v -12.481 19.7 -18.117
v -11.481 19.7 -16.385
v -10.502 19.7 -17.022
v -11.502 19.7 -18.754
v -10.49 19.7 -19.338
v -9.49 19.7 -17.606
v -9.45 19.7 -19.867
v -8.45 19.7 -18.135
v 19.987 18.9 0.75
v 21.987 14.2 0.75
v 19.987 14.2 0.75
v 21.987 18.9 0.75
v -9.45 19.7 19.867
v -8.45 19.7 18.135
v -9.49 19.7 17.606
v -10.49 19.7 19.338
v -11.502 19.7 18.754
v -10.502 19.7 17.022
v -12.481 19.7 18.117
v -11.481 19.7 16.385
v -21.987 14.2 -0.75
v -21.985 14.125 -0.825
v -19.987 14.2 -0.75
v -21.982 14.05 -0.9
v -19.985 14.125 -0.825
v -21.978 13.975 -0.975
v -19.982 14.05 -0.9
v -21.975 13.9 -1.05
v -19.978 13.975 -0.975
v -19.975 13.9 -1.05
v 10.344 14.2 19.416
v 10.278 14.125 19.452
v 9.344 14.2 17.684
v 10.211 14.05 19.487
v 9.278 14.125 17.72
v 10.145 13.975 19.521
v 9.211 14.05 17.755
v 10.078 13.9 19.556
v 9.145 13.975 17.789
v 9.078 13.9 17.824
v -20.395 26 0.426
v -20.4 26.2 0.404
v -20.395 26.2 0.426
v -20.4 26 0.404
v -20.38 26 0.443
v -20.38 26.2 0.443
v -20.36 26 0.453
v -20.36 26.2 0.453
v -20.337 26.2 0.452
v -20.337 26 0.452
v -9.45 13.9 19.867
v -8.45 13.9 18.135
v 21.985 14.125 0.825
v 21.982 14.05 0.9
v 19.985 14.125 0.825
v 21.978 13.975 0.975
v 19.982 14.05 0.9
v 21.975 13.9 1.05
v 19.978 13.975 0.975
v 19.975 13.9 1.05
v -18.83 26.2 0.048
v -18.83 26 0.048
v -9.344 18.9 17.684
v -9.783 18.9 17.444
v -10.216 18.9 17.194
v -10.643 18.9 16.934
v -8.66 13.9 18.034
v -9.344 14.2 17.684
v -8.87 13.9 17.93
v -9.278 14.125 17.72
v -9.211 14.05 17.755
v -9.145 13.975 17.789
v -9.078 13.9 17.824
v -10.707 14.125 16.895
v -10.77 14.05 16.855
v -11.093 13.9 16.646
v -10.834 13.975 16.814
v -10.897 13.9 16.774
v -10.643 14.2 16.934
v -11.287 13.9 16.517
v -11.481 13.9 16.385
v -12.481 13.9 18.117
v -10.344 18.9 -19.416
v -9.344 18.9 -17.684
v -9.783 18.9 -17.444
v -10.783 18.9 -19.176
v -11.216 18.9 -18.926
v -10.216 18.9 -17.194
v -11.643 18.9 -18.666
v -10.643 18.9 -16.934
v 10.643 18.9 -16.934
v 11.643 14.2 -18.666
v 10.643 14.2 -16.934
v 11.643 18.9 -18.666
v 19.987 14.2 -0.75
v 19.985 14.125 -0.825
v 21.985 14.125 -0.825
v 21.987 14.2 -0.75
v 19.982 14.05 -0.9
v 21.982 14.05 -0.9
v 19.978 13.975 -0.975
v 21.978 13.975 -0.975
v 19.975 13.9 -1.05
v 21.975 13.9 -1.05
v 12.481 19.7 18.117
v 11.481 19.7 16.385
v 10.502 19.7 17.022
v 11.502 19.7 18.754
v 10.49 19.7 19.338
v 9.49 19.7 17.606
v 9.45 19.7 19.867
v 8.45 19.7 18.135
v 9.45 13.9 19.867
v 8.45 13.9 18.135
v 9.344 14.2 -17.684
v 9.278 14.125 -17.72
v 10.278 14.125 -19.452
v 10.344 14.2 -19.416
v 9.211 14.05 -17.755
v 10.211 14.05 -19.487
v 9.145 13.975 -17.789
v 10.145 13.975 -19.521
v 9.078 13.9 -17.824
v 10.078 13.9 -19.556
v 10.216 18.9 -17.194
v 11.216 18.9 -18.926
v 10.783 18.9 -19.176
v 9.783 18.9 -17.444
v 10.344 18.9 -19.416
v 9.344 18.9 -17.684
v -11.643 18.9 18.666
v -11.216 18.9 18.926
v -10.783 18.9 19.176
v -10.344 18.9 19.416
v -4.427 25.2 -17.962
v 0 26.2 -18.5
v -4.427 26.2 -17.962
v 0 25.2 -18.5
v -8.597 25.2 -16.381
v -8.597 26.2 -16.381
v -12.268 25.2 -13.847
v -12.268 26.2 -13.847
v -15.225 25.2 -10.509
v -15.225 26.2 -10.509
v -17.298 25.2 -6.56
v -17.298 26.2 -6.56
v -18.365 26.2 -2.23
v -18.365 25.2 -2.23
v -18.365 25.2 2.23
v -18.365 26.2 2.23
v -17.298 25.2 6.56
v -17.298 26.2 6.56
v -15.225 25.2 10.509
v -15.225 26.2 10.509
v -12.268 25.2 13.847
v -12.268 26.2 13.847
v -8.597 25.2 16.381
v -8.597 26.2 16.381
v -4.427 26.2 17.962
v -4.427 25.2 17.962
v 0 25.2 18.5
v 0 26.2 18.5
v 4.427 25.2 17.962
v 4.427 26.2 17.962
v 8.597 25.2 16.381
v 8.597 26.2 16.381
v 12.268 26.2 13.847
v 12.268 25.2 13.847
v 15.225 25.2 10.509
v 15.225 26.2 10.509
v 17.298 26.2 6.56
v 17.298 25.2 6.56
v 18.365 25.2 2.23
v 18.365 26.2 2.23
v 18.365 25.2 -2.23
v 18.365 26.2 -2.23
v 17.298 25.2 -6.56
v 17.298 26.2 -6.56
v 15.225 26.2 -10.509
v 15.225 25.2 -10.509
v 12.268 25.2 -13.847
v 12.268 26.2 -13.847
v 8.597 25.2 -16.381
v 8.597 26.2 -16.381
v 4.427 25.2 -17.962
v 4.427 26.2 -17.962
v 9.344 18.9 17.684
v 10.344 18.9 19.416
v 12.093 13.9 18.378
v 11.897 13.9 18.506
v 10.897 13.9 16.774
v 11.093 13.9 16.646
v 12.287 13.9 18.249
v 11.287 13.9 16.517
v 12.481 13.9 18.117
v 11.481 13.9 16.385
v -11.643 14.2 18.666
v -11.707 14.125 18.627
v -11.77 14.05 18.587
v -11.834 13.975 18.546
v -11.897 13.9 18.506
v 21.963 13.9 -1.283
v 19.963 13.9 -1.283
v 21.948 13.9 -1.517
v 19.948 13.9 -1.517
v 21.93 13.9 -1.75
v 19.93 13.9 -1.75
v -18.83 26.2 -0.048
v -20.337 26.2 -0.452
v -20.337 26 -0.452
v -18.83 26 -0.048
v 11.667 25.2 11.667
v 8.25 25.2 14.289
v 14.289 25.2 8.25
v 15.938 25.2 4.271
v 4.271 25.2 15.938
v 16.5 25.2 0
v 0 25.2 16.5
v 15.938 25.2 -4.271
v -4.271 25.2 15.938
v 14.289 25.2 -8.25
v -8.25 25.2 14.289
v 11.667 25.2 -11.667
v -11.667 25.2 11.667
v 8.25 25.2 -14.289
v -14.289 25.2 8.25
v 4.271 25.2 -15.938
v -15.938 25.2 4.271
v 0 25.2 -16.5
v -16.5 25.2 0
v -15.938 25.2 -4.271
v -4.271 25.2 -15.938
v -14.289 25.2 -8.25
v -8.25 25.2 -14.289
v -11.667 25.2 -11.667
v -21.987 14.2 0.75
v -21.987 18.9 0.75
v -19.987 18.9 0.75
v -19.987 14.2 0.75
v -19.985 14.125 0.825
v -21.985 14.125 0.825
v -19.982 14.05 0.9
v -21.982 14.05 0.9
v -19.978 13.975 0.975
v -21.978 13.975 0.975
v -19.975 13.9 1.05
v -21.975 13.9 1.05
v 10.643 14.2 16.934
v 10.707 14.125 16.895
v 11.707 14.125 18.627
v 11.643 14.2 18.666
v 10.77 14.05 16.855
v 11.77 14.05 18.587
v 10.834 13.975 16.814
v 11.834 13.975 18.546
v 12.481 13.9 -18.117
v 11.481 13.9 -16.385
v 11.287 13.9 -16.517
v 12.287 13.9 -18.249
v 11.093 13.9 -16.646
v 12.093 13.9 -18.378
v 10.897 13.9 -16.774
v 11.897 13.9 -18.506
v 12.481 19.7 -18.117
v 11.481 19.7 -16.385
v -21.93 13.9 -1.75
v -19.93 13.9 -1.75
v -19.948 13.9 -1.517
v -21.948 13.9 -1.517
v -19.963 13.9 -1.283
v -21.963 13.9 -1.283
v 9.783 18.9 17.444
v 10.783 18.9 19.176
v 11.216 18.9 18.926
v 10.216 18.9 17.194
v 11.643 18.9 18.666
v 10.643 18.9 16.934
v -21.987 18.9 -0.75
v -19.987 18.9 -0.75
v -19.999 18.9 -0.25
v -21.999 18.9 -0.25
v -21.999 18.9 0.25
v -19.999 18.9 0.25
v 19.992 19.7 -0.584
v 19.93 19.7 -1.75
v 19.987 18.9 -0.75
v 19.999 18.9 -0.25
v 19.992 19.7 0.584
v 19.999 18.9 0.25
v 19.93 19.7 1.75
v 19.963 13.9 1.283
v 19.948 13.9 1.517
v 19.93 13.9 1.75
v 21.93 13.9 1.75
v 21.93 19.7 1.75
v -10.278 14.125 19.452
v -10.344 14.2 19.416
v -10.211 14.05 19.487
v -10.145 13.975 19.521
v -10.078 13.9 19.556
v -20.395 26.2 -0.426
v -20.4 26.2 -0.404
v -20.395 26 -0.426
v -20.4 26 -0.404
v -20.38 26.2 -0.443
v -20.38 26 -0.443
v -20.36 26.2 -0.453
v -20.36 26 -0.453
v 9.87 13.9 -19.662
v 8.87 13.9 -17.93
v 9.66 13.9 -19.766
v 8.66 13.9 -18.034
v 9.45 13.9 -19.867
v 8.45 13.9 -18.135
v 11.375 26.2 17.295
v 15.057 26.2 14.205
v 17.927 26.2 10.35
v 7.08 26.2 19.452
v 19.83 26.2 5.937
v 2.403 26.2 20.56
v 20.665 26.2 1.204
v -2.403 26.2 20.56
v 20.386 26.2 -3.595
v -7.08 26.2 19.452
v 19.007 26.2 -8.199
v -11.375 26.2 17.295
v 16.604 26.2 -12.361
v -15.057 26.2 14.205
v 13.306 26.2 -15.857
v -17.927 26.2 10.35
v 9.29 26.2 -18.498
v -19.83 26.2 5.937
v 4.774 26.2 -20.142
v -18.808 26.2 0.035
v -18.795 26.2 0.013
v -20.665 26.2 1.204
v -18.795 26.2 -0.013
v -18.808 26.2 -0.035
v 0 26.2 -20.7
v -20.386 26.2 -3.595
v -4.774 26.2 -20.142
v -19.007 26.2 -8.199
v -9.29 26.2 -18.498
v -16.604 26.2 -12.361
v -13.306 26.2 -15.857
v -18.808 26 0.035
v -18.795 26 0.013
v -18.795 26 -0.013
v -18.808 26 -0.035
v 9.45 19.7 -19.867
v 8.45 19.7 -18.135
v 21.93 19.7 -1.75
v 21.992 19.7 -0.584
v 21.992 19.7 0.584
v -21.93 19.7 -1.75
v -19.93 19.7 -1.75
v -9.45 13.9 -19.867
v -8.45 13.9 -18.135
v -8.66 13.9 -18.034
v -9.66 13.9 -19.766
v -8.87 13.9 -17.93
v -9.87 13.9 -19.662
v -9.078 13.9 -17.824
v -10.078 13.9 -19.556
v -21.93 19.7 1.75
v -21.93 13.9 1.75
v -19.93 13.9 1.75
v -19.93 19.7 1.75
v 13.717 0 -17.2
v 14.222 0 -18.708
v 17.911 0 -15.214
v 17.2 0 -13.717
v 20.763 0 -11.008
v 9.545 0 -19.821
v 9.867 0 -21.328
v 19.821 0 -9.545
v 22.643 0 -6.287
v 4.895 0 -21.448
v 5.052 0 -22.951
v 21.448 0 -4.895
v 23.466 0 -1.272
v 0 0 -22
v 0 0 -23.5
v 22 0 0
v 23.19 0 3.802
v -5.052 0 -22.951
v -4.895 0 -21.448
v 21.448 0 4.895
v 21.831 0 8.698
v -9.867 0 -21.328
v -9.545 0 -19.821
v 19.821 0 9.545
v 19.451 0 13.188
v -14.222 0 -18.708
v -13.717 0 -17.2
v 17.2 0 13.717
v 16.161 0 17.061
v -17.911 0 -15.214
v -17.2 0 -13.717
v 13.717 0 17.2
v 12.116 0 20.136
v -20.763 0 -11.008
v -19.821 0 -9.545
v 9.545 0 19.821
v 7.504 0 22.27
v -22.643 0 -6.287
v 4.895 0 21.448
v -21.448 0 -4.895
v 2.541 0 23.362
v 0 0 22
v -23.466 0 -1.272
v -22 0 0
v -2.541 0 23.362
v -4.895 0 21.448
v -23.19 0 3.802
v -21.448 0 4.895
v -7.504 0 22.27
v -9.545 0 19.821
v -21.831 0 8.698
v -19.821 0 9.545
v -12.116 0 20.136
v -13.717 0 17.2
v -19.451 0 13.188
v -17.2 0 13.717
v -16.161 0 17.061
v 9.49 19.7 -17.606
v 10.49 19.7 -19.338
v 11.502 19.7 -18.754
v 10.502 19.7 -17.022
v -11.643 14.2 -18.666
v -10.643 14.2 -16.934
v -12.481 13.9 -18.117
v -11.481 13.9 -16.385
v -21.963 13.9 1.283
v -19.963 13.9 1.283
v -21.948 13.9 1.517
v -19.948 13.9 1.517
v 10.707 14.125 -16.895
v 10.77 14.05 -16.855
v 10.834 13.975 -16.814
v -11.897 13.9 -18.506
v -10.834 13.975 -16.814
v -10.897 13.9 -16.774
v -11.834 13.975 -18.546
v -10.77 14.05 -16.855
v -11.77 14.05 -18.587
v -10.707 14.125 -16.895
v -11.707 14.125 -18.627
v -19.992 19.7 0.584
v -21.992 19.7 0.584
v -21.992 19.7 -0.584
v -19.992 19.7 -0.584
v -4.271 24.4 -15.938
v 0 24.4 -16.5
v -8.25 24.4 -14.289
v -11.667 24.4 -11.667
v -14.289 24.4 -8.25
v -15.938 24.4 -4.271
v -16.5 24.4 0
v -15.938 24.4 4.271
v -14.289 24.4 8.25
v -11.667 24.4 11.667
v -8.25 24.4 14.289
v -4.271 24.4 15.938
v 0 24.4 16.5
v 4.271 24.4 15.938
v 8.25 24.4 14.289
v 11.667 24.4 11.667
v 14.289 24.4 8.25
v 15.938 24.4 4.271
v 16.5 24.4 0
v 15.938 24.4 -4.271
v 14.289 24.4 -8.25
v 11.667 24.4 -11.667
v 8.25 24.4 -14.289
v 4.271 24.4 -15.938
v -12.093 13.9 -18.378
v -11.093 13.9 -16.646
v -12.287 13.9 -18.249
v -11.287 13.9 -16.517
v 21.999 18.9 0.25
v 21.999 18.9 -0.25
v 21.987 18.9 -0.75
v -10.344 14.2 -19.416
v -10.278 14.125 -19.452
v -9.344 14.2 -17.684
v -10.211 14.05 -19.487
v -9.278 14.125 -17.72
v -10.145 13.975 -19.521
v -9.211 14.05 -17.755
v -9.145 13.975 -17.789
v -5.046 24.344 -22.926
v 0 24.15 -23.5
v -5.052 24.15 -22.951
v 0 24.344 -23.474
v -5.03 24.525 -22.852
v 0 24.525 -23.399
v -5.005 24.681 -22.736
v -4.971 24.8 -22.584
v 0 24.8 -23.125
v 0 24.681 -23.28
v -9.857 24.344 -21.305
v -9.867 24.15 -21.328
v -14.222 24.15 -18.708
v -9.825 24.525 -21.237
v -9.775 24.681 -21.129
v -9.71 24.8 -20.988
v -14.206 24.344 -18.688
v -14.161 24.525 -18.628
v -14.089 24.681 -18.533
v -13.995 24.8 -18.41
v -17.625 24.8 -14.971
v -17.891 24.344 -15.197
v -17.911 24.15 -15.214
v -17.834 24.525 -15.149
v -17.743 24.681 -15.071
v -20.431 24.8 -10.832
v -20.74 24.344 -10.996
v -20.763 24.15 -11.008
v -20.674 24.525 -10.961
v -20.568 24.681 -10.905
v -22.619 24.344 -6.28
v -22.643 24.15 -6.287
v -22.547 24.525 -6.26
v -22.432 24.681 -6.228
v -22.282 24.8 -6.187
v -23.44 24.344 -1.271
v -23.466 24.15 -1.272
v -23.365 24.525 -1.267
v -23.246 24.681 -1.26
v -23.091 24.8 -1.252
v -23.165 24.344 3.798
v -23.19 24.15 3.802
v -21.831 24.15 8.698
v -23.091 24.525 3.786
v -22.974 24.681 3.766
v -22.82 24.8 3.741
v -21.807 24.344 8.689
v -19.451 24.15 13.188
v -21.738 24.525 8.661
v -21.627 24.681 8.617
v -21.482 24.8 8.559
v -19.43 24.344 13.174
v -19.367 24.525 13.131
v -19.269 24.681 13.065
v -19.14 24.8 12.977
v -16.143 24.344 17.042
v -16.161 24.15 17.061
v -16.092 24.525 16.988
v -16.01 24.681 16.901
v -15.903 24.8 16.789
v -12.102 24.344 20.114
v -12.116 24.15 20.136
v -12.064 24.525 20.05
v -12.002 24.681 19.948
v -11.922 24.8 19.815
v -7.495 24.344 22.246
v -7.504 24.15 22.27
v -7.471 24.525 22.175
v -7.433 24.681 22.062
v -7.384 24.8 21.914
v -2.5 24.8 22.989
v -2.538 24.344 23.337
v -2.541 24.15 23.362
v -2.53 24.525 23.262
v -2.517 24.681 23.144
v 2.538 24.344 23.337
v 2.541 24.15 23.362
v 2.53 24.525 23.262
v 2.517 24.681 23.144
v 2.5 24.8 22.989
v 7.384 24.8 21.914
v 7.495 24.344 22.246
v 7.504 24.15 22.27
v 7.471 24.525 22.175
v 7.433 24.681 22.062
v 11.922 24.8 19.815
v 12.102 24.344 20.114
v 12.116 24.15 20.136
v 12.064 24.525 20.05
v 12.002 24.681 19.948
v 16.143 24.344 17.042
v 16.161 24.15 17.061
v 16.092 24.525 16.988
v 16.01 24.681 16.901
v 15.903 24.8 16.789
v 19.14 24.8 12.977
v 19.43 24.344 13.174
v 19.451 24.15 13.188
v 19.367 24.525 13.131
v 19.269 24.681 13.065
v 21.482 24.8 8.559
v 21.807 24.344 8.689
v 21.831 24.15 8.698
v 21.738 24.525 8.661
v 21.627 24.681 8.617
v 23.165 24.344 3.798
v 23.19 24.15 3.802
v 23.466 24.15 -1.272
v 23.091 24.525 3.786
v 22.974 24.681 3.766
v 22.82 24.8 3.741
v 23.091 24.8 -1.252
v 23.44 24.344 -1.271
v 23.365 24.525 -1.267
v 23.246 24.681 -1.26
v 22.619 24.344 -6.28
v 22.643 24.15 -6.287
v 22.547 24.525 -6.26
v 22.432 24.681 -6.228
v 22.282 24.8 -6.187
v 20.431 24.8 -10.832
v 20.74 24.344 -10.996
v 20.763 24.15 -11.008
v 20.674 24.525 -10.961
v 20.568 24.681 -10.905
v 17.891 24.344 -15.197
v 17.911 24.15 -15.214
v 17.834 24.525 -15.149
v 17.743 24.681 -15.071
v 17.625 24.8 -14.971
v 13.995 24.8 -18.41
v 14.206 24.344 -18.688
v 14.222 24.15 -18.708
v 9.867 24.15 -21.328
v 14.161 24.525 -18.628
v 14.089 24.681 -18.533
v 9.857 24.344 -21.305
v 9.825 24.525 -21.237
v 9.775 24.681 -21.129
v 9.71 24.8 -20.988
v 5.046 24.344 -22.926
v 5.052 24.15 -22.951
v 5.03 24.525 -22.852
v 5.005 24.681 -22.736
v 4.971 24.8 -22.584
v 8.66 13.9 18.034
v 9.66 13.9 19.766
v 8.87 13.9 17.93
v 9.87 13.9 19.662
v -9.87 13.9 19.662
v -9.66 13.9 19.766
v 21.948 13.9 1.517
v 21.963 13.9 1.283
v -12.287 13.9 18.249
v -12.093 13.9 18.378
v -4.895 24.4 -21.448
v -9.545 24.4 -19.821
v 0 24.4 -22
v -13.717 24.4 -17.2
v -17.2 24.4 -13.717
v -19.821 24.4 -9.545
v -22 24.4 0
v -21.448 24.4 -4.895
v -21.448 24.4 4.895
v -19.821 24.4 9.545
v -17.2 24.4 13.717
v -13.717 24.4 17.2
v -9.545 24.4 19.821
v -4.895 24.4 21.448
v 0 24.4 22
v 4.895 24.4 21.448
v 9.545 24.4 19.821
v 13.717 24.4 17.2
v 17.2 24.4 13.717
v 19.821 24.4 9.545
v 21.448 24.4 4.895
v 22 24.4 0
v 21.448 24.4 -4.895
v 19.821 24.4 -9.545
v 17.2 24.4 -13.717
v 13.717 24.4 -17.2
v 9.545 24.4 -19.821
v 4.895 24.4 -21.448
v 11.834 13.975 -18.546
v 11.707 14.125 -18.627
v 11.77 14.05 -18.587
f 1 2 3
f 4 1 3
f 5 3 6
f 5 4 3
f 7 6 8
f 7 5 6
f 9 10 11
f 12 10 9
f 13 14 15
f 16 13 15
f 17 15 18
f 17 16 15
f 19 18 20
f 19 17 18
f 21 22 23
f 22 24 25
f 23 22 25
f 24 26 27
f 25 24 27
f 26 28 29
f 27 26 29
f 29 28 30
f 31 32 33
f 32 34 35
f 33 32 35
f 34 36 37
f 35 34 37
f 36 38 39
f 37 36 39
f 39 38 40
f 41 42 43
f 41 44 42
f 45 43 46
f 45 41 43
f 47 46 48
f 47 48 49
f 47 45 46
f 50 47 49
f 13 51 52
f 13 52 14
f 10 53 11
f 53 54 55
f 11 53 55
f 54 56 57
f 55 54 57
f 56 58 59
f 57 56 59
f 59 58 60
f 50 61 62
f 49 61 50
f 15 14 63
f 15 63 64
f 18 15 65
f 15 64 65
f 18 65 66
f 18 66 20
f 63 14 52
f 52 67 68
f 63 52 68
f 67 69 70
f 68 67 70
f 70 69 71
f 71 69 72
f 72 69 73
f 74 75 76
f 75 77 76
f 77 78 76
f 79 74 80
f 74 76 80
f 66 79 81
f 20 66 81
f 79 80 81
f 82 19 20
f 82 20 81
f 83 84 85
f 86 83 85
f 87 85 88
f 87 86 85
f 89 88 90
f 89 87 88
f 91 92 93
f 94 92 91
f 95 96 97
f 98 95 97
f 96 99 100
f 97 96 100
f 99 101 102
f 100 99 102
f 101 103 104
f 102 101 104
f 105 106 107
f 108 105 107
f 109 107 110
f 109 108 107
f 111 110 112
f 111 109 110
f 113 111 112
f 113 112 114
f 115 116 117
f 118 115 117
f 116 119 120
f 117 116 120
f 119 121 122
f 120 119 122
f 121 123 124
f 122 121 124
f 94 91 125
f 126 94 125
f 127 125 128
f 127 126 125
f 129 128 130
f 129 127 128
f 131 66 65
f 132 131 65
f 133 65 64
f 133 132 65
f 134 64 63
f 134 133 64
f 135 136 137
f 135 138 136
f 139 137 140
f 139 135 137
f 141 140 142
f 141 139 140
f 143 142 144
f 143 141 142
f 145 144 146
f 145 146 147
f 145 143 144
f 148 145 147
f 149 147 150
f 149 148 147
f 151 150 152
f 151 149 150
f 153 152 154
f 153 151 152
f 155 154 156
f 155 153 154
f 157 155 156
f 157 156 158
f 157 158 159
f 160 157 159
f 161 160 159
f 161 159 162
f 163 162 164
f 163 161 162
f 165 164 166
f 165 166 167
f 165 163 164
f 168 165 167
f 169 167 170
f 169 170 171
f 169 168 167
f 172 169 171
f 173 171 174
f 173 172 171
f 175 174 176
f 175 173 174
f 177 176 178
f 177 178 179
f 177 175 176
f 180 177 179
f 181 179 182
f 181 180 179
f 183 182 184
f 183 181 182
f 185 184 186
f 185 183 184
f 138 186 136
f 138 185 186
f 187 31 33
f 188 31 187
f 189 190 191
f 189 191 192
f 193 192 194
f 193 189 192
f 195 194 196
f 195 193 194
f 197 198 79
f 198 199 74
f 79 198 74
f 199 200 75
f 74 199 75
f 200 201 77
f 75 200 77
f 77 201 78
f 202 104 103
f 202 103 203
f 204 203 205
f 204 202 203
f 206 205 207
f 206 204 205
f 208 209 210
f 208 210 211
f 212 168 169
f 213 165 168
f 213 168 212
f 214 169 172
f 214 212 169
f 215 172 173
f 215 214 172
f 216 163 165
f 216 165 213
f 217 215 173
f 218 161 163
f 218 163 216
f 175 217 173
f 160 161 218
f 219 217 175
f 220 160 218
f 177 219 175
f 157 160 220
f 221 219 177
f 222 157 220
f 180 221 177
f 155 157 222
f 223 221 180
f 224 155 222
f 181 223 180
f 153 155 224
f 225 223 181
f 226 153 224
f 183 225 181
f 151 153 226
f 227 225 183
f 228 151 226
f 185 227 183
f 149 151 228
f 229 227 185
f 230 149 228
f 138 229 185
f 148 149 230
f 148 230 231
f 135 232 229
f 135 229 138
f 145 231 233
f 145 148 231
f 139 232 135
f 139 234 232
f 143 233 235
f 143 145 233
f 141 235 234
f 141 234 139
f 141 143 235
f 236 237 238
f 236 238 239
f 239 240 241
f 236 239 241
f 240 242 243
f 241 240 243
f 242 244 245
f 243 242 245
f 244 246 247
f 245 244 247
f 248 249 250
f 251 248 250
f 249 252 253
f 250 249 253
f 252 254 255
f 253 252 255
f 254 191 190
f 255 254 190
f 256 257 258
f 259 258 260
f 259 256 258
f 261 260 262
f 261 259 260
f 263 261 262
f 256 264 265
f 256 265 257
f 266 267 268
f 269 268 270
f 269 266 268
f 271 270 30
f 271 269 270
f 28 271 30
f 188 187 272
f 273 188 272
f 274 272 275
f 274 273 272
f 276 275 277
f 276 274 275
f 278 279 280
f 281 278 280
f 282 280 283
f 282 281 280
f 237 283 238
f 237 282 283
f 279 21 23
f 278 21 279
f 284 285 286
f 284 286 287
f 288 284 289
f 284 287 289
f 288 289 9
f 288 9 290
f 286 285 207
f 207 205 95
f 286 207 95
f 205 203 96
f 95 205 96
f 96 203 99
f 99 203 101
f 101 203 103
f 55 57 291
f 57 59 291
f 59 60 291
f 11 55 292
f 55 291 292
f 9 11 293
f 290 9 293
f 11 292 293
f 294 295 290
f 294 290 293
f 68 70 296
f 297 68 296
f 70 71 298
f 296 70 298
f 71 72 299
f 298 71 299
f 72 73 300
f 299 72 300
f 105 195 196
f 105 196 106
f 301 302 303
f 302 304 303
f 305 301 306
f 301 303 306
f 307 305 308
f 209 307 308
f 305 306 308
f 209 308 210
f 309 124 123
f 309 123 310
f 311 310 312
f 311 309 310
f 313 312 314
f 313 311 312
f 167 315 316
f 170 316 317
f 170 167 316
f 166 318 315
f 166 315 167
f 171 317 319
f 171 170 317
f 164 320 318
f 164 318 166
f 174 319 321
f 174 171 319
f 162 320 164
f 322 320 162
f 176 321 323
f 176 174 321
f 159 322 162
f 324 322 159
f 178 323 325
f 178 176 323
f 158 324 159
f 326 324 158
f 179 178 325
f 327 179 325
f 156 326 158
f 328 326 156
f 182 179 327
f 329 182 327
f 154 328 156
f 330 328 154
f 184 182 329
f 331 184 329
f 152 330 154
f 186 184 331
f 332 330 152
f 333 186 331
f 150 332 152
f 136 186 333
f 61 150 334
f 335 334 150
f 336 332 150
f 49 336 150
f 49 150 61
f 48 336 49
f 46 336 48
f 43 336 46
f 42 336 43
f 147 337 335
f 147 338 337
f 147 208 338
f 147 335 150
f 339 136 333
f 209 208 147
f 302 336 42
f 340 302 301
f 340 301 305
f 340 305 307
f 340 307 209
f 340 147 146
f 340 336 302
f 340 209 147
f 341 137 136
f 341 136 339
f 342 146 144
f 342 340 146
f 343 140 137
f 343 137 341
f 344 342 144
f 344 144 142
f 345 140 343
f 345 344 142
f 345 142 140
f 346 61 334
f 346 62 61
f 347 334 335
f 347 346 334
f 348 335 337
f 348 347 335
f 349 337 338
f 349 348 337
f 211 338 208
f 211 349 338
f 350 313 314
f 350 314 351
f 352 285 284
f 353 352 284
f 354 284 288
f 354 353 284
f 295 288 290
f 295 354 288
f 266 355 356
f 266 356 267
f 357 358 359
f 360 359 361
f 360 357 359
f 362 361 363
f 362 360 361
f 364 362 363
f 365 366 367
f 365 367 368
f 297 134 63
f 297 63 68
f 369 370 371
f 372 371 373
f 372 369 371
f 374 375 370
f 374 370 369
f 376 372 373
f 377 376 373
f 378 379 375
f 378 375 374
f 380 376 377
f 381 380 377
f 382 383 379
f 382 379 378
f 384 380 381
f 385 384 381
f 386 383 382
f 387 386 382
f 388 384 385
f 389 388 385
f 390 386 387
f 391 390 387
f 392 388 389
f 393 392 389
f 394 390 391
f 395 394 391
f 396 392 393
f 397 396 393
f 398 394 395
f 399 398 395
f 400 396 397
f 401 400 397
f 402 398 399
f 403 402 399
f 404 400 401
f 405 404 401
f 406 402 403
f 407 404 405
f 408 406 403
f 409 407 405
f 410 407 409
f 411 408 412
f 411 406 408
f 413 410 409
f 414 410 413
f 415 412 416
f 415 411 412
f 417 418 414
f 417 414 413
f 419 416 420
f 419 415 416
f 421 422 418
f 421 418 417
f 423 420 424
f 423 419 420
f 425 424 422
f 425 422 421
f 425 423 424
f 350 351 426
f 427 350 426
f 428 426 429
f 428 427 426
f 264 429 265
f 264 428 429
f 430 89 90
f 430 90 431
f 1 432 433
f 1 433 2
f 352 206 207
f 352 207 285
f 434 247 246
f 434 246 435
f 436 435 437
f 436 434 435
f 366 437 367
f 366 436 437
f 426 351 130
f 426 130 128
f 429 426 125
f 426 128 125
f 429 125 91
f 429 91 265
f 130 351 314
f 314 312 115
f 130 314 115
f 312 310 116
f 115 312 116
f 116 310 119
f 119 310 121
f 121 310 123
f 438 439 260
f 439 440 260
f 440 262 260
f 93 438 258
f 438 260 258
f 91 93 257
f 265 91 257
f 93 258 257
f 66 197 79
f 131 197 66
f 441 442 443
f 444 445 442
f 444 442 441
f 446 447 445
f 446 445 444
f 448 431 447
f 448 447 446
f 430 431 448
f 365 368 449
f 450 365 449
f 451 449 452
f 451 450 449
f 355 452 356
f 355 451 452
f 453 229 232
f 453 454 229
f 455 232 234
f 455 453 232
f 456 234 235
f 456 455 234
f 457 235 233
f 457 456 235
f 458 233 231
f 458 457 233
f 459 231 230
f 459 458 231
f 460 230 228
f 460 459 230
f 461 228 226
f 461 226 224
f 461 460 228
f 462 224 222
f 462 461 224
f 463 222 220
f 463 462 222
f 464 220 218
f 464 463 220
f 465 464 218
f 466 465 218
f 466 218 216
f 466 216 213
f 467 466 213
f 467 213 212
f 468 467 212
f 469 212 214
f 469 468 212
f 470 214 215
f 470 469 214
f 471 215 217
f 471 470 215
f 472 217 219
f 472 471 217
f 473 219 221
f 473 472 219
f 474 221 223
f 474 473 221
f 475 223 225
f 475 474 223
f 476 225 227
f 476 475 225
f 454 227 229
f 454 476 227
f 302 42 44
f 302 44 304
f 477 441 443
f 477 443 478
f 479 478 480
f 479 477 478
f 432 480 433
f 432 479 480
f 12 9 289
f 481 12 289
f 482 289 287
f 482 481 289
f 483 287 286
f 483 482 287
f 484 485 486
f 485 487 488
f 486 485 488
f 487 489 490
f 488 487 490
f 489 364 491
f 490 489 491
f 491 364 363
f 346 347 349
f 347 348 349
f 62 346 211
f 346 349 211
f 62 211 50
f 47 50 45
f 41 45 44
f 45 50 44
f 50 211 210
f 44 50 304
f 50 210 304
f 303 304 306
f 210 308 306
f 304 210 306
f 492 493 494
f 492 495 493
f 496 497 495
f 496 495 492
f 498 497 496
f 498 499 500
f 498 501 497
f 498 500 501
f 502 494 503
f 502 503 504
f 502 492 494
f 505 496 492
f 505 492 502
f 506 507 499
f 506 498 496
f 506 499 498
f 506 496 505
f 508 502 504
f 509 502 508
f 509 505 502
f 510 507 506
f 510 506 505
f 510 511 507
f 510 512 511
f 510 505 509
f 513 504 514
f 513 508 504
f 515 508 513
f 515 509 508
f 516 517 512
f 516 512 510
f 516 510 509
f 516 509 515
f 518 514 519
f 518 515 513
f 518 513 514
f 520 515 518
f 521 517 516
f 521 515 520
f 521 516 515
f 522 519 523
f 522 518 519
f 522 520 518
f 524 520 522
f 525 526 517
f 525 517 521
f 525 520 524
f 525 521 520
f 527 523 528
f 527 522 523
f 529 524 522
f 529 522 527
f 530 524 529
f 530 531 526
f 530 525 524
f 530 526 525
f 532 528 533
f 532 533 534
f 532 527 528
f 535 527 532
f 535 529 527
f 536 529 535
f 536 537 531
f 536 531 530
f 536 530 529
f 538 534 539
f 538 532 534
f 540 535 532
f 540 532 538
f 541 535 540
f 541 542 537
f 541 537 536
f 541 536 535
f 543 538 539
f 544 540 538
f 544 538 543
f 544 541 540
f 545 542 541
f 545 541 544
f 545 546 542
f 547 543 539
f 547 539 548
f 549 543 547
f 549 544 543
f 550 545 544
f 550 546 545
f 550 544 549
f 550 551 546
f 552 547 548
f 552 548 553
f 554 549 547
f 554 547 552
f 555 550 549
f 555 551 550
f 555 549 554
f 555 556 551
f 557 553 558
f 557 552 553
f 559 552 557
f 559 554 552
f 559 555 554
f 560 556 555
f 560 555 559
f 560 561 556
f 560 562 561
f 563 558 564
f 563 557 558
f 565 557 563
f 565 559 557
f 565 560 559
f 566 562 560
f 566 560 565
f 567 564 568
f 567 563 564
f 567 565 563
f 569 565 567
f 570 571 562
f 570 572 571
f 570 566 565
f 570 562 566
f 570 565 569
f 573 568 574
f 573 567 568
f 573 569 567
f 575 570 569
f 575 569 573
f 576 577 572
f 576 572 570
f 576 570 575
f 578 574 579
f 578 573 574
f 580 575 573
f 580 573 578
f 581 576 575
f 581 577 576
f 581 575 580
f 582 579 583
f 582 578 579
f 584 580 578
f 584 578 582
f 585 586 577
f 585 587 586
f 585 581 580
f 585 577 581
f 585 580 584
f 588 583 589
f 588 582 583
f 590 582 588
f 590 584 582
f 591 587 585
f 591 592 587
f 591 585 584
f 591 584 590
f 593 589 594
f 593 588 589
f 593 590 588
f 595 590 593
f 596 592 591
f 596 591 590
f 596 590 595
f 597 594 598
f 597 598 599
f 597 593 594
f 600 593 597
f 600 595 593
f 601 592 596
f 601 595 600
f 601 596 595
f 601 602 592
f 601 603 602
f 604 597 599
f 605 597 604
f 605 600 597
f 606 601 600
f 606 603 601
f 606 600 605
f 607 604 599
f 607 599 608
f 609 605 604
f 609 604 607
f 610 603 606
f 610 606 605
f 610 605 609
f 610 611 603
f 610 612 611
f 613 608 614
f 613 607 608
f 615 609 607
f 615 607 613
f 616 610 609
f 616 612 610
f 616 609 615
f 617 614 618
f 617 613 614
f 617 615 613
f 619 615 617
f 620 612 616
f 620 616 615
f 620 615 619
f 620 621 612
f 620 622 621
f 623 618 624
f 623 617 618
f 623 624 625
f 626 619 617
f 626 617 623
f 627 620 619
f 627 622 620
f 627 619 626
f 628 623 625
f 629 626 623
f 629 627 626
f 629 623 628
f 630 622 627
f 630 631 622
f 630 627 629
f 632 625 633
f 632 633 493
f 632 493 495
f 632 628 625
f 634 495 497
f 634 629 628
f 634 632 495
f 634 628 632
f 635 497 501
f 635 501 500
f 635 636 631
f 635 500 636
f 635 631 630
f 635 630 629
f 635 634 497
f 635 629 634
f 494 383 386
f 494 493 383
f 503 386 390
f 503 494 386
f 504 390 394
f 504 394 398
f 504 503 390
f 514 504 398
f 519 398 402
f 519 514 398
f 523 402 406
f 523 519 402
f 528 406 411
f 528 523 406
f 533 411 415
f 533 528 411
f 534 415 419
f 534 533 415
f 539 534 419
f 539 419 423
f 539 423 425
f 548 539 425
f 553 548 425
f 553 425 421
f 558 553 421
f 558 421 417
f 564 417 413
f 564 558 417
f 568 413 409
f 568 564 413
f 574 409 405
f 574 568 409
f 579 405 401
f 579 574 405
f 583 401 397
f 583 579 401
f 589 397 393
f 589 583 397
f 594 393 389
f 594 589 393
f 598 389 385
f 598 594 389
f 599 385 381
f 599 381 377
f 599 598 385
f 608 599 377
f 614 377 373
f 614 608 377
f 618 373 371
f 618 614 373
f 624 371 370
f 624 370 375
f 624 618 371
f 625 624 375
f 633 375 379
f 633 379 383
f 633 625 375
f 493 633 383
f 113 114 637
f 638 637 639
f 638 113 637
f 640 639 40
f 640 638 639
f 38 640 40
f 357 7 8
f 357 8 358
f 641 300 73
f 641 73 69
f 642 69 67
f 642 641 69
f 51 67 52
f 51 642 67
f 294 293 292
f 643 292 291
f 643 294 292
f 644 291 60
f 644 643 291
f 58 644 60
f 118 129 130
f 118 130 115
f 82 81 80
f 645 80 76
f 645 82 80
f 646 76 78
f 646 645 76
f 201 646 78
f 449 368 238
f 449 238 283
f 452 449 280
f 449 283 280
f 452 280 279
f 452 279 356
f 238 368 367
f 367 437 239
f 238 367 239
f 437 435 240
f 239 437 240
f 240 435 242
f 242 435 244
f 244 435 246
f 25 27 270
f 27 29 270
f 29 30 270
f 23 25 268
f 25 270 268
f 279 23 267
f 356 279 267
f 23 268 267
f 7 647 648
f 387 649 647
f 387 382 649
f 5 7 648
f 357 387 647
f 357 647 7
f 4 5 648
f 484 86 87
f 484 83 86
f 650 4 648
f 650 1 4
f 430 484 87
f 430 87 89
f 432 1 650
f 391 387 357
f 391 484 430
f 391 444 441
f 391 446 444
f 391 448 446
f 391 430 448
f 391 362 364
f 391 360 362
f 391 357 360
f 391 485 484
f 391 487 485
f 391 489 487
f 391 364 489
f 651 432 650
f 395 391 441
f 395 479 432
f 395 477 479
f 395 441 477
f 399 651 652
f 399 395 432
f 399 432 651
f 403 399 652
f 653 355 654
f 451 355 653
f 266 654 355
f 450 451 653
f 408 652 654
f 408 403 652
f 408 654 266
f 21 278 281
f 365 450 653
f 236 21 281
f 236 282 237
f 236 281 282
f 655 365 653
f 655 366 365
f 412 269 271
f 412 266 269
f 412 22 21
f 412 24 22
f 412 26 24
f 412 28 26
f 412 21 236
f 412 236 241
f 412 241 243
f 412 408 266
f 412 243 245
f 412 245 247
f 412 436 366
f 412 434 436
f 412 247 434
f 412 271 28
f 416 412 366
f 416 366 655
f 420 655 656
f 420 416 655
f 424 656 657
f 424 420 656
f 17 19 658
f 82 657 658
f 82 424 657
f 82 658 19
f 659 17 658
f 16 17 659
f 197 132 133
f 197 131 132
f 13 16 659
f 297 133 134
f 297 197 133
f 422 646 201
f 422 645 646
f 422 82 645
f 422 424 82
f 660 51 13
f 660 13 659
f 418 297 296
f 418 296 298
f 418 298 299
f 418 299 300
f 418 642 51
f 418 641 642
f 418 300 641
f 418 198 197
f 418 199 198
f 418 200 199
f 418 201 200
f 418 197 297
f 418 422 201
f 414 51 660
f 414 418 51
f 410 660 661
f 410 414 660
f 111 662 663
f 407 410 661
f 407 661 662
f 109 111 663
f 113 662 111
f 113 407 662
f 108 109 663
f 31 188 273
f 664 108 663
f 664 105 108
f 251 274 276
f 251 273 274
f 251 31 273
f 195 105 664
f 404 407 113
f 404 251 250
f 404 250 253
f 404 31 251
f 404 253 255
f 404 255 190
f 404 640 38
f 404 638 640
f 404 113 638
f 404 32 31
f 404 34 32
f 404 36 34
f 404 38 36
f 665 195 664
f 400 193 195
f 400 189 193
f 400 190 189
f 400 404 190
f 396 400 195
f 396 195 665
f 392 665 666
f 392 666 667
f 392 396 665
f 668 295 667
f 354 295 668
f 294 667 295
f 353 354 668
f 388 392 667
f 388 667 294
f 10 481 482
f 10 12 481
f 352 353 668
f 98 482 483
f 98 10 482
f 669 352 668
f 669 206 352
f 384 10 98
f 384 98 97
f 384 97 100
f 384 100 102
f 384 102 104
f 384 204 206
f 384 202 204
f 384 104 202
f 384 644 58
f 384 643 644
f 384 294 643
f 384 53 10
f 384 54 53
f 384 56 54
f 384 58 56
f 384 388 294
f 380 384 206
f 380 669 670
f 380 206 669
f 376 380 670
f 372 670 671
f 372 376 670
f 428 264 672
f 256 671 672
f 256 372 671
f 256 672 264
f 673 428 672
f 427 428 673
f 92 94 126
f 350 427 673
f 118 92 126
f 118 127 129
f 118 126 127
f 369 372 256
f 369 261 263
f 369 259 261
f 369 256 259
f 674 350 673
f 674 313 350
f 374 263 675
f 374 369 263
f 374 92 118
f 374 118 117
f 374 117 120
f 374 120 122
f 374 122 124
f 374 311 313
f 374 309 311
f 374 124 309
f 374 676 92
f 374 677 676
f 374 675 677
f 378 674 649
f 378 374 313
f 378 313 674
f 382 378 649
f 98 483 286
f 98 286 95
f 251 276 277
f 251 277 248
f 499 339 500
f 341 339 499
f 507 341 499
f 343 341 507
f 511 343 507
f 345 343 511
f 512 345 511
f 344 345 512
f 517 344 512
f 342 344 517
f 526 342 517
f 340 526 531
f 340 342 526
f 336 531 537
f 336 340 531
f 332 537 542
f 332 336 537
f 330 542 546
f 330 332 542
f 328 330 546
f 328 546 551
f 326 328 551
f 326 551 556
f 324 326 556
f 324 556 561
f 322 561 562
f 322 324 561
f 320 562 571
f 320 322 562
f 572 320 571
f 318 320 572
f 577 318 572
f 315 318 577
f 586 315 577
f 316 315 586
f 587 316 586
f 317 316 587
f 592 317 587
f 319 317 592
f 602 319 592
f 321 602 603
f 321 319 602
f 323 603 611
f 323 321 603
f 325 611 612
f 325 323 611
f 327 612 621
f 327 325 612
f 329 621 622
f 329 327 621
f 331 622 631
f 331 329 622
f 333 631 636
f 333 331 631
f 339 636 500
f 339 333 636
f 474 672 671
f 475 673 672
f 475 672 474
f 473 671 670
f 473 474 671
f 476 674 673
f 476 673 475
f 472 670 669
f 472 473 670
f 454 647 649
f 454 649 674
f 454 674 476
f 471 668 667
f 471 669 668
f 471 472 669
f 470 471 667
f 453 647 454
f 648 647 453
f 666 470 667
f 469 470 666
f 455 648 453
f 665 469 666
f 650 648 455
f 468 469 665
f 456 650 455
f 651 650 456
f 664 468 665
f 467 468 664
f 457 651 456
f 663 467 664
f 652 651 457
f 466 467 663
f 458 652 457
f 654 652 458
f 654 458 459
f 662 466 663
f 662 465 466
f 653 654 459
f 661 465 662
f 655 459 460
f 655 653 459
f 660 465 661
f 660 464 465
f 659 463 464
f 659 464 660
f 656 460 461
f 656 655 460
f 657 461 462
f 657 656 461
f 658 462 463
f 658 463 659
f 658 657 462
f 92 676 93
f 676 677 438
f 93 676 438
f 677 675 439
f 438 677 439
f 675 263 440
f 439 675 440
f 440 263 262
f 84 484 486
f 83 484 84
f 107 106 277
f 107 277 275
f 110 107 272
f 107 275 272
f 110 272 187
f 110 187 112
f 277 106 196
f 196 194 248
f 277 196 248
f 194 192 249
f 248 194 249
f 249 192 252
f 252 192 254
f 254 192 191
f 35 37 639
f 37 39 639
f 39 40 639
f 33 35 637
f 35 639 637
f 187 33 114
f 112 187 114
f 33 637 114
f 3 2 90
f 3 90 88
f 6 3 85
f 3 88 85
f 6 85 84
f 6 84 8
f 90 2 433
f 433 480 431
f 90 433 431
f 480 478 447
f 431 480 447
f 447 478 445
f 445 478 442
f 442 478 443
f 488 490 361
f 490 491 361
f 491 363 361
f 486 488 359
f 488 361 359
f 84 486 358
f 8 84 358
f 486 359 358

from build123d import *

# Parameters (mm, degrees)
EXTRUDE_5_REACH          = 62.717
EXTRUDE_5_START_RADIUS   = 22
EXTRUDE_5_END_RADIUS     = 22
PATTERN_CIRCULAR_2_COUNT = 6
CUT_EXTRUDE_1_DEPTH      = 0.2
FILLET_1_R               = 0.05
CHAMFER_1_SIZE           = 0.3


with BuildPart() as part:
    # 草图1 → 旋转1 (revolve)
    with BuildSketch(Plane.XY, mode=Mode.PRIVATE) as revolve_1_sk:
        with BuildLine():
            Line((-22, 0), (-23.5, 0))
            Line((-23.5, 0), (-23.5, 24.150257739))
            ThreePointArc((-23.5, 24.150257739), (-23.399484522, 24.525386608), (-23.124871131, 24.8))
            Line((-23.124871131, 24.8), (-20.7, 26.2))
            Line((-20.7, 26.2), (-18.5, 26.2))
            Line((-18.5, 26.2), (-18.5, 25.2))
            Line((-18.5, 25.2), (-16.5, 25.2))
            Line((-16.5, 25.2), (-16.5, 24.4))
            Line((-16.5, 24.4), (-22, 24.4))
            Line((-22, 24.4), (-22, 0))
        make_face()
    revolve(revolve_1_sk.sketch.rotate(Axis((0, 0, 0), (0, 1, 0)), 270), axis=Axis((0, 0, 0), (0, 1, 0)))

    # 凸台-拉伸5: from a cylinder face, 62.717 long prism both ways, kept between that surface and its translate by the depth
    extrude_5_start = Plane(origin=(0, 16.4, 0), z_dir=(0, -1, 0)) * Cylinder(EXTRUDE_5_START_RADIUS, 170.434, mode=Mode.PRIVATE)
    extrude_5_end = Plane(origin=(2, 16.4, 0), z_dir=(0, -1, 0)) * Cylinder(EXTRUDE_5_END_RADIUS, 170.434, mode=Mode.PRIVATE)
    # 草图5 → 凸台-拉伸5 (add, from a surface)
    with BuildSketch(Plane.ZY.offset(23.5), mode=Mode.PRIVATE) as extrude_5_sk1:
        Polygon((-0.75, 13.9), (-0.75, 18.9), (0.75, 18.9), (0.75, 13.9), (1.75, 13.9), (1.75, 19.7), (-1.75, 19.7), (-1.75, 13.9), align=None)
    extrude_5_tool1 = extrude(extrude_5_sk1.sketch, amount=EXTRUDE_5_REACH, both=True, mode=Mode.PRIVATE)
    extrude_5 = ((extrude_5_tool1 & extrude_5_start) - extrude_5_end).solids().sort_by_distance((-20.95875, 16.4, -0.817742))[0]
    add(extrude_5)

    # 阵列(圆周)2: 凸台-拉伸5 ×6 about axis
    pattern_circular_2_axis = Axis((0, 0, 0), (0, 1, 0))
    for i in range(1, PATTERN_CIRCULAR_2_COUNT):
        add(extrude_5.rotate(pattern_circular_2_axis, i * 360 / PATTERN_CIRCULAR_2_COUNT))

    # 草图6 → 切除-拉伸1 (cut)
    with BuildSketch(Plane(origin=(0, 26.2, 0), x_dir=(1, 0, 0), z_dir=(0, 1, 0))):
        Polygon((-20.4, 0.468911087), (-18.65, 0), (-20.4, -0.468911087), align=None)
    extrude(amount=-CUT_EXTRUDE_1_DEPTH, mode=Mode.SUBTRACT)

    # 圆角1
    fillet_1_edges = [part.edges().sort_by_distance(p)[0] for p in [
        (-20.4, 26.1, 0.468911087),
        (-20.4, 26.1, -0.468911087),
        (-18.65, 26.1, 0),
    ]]
    fillet(fillet_1_edges, radius=FILLET_1_R)

    # 倒角1
    chamfer_1_edges = [part.edges().sort_by_distance(p)[0] for p in [
        (11.143125149, 13.9, 17.800458913),
        (9.844087043, 13.9, 18.550458913),
        (-9.844087043, 13.9, 18.550458913),
        (-11.143125149, 13.9, 17.800458913),
        (-20.987212193, 13.9, 0.75),
        (-20.987212193, 13.9, -0.75),
        (-11.143125149, 13.9, -17.800458913),
        (-9.844087043, 13.9, -18.550458913),
        (9.844087043, 13.9, -18.550458913),
        (11.143125149, 13.9, -17.800458913),
        (20.987212193, 13.9, -0.75),
        (20.987212193, 13.9, 0.75),
    ]]
    chamfer(chamfer_1_edges, length=CHAMFER_1_SIZE)


solid = part.part
